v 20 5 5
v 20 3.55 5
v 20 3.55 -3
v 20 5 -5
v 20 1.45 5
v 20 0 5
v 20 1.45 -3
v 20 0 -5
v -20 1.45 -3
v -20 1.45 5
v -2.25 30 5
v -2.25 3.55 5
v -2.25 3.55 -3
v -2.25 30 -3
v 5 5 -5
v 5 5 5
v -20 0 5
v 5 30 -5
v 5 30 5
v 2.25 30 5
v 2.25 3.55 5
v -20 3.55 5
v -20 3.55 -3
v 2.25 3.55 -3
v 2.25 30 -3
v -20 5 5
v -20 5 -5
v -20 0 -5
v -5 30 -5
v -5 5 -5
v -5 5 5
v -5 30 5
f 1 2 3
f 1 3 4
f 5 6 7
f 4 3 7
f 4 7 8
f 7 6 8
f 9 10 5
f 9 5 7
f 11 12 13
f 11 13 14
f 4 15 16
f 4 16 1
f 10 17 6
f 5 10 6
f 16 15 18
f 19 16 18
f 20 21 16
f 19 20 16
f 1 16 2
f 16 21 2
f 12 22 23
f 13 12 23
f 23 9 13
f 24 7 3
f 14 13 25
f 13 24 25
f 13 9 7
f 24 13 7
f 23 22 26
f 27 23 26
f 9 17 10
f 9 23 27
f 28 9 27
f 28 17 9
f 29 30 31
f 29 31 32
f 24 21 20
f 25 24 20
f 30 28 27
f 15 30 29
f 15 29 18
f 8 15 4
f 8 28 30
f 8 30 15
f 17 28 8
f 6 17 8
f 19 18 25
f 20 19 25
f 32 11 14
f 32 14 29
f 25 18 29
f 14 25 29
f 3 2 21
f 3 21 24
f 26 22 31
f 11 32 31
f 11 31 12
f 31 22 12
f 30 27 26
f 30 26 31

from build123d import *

# Parameters (mm, degrees)
SKETCH1_W           = 40
SKETCH1_H           = 10
BOSS_EXTRUDE1_DEPTH = 5
SKETCH2_W           = 8
SKETCH2_H           = 2.1
CUT_EXTRUDE2_DEPTH  = 41
SKETCH3_W           = 10
SKETCH3_H           = 25
BOSS_EXTRUDE2_DEPTH = 10
SKETCH4_W           = 2.25
SKETCH4_H           = 26.45
CUT_EXTRUDE3_DEPTH  = 8


with BuildPart() as part:
    # Sketch1 → Boss-Extrude1 (new body)
    with BuildSketch(Plane(origin=(0, 0, 0), x_dir=(1, 0, 0), z_dir=(0, 1, 0))):
        Rectangle(SKETCH1_W, SKETCH1_H)
    extrude(amount=BOSS_EXTRUDE1_DEPTH)

    # Sketch2 → Cut-Extrude2 (cut, through all)
    with BuildSketch(Plane(origin=(20, 0, 0), x_dir=(0, 0, -1), z_dir=(1, 0, 0))):
        with Locations((-1, 2.5)):
            Rectangle(SKETCH2_W, SKETCH2_H)
    extrude(amount=-CUT_EXTRUDE2_DEPTH, mode=Mode.SUBTRACT)

    # Sketch3 → Boss-Extrude2 (add)
    with BuildSketch(Plane(origin=(0, 0, -5), x_dir=(-1, 0, 0), z_dir=(0, 0, -1))):
        with Locations((0, 17.5)):
            Rectangle(SKETCH3_W, SKETCH3_H)
    extrude(amount=-BOSS_EXTRUDE2_DEPTH)

    # Sketch4 → Cut-Extrude3 (cut)
    with BuildSketch(Plane.XY.offset(5)):
        with Locations((-1.125, 16.775)):
            Rectangle(SKETCH4_W, SKETCH4_H)
        with Locations((1.125, 16.775)):
            Rectangle(SKETCH4_W, SKETCH4_H)
    extrude(amount=-CUT_EXTRUDE3_DEPTH, mode=Mode.SUBTRACT)


solid = part.part
